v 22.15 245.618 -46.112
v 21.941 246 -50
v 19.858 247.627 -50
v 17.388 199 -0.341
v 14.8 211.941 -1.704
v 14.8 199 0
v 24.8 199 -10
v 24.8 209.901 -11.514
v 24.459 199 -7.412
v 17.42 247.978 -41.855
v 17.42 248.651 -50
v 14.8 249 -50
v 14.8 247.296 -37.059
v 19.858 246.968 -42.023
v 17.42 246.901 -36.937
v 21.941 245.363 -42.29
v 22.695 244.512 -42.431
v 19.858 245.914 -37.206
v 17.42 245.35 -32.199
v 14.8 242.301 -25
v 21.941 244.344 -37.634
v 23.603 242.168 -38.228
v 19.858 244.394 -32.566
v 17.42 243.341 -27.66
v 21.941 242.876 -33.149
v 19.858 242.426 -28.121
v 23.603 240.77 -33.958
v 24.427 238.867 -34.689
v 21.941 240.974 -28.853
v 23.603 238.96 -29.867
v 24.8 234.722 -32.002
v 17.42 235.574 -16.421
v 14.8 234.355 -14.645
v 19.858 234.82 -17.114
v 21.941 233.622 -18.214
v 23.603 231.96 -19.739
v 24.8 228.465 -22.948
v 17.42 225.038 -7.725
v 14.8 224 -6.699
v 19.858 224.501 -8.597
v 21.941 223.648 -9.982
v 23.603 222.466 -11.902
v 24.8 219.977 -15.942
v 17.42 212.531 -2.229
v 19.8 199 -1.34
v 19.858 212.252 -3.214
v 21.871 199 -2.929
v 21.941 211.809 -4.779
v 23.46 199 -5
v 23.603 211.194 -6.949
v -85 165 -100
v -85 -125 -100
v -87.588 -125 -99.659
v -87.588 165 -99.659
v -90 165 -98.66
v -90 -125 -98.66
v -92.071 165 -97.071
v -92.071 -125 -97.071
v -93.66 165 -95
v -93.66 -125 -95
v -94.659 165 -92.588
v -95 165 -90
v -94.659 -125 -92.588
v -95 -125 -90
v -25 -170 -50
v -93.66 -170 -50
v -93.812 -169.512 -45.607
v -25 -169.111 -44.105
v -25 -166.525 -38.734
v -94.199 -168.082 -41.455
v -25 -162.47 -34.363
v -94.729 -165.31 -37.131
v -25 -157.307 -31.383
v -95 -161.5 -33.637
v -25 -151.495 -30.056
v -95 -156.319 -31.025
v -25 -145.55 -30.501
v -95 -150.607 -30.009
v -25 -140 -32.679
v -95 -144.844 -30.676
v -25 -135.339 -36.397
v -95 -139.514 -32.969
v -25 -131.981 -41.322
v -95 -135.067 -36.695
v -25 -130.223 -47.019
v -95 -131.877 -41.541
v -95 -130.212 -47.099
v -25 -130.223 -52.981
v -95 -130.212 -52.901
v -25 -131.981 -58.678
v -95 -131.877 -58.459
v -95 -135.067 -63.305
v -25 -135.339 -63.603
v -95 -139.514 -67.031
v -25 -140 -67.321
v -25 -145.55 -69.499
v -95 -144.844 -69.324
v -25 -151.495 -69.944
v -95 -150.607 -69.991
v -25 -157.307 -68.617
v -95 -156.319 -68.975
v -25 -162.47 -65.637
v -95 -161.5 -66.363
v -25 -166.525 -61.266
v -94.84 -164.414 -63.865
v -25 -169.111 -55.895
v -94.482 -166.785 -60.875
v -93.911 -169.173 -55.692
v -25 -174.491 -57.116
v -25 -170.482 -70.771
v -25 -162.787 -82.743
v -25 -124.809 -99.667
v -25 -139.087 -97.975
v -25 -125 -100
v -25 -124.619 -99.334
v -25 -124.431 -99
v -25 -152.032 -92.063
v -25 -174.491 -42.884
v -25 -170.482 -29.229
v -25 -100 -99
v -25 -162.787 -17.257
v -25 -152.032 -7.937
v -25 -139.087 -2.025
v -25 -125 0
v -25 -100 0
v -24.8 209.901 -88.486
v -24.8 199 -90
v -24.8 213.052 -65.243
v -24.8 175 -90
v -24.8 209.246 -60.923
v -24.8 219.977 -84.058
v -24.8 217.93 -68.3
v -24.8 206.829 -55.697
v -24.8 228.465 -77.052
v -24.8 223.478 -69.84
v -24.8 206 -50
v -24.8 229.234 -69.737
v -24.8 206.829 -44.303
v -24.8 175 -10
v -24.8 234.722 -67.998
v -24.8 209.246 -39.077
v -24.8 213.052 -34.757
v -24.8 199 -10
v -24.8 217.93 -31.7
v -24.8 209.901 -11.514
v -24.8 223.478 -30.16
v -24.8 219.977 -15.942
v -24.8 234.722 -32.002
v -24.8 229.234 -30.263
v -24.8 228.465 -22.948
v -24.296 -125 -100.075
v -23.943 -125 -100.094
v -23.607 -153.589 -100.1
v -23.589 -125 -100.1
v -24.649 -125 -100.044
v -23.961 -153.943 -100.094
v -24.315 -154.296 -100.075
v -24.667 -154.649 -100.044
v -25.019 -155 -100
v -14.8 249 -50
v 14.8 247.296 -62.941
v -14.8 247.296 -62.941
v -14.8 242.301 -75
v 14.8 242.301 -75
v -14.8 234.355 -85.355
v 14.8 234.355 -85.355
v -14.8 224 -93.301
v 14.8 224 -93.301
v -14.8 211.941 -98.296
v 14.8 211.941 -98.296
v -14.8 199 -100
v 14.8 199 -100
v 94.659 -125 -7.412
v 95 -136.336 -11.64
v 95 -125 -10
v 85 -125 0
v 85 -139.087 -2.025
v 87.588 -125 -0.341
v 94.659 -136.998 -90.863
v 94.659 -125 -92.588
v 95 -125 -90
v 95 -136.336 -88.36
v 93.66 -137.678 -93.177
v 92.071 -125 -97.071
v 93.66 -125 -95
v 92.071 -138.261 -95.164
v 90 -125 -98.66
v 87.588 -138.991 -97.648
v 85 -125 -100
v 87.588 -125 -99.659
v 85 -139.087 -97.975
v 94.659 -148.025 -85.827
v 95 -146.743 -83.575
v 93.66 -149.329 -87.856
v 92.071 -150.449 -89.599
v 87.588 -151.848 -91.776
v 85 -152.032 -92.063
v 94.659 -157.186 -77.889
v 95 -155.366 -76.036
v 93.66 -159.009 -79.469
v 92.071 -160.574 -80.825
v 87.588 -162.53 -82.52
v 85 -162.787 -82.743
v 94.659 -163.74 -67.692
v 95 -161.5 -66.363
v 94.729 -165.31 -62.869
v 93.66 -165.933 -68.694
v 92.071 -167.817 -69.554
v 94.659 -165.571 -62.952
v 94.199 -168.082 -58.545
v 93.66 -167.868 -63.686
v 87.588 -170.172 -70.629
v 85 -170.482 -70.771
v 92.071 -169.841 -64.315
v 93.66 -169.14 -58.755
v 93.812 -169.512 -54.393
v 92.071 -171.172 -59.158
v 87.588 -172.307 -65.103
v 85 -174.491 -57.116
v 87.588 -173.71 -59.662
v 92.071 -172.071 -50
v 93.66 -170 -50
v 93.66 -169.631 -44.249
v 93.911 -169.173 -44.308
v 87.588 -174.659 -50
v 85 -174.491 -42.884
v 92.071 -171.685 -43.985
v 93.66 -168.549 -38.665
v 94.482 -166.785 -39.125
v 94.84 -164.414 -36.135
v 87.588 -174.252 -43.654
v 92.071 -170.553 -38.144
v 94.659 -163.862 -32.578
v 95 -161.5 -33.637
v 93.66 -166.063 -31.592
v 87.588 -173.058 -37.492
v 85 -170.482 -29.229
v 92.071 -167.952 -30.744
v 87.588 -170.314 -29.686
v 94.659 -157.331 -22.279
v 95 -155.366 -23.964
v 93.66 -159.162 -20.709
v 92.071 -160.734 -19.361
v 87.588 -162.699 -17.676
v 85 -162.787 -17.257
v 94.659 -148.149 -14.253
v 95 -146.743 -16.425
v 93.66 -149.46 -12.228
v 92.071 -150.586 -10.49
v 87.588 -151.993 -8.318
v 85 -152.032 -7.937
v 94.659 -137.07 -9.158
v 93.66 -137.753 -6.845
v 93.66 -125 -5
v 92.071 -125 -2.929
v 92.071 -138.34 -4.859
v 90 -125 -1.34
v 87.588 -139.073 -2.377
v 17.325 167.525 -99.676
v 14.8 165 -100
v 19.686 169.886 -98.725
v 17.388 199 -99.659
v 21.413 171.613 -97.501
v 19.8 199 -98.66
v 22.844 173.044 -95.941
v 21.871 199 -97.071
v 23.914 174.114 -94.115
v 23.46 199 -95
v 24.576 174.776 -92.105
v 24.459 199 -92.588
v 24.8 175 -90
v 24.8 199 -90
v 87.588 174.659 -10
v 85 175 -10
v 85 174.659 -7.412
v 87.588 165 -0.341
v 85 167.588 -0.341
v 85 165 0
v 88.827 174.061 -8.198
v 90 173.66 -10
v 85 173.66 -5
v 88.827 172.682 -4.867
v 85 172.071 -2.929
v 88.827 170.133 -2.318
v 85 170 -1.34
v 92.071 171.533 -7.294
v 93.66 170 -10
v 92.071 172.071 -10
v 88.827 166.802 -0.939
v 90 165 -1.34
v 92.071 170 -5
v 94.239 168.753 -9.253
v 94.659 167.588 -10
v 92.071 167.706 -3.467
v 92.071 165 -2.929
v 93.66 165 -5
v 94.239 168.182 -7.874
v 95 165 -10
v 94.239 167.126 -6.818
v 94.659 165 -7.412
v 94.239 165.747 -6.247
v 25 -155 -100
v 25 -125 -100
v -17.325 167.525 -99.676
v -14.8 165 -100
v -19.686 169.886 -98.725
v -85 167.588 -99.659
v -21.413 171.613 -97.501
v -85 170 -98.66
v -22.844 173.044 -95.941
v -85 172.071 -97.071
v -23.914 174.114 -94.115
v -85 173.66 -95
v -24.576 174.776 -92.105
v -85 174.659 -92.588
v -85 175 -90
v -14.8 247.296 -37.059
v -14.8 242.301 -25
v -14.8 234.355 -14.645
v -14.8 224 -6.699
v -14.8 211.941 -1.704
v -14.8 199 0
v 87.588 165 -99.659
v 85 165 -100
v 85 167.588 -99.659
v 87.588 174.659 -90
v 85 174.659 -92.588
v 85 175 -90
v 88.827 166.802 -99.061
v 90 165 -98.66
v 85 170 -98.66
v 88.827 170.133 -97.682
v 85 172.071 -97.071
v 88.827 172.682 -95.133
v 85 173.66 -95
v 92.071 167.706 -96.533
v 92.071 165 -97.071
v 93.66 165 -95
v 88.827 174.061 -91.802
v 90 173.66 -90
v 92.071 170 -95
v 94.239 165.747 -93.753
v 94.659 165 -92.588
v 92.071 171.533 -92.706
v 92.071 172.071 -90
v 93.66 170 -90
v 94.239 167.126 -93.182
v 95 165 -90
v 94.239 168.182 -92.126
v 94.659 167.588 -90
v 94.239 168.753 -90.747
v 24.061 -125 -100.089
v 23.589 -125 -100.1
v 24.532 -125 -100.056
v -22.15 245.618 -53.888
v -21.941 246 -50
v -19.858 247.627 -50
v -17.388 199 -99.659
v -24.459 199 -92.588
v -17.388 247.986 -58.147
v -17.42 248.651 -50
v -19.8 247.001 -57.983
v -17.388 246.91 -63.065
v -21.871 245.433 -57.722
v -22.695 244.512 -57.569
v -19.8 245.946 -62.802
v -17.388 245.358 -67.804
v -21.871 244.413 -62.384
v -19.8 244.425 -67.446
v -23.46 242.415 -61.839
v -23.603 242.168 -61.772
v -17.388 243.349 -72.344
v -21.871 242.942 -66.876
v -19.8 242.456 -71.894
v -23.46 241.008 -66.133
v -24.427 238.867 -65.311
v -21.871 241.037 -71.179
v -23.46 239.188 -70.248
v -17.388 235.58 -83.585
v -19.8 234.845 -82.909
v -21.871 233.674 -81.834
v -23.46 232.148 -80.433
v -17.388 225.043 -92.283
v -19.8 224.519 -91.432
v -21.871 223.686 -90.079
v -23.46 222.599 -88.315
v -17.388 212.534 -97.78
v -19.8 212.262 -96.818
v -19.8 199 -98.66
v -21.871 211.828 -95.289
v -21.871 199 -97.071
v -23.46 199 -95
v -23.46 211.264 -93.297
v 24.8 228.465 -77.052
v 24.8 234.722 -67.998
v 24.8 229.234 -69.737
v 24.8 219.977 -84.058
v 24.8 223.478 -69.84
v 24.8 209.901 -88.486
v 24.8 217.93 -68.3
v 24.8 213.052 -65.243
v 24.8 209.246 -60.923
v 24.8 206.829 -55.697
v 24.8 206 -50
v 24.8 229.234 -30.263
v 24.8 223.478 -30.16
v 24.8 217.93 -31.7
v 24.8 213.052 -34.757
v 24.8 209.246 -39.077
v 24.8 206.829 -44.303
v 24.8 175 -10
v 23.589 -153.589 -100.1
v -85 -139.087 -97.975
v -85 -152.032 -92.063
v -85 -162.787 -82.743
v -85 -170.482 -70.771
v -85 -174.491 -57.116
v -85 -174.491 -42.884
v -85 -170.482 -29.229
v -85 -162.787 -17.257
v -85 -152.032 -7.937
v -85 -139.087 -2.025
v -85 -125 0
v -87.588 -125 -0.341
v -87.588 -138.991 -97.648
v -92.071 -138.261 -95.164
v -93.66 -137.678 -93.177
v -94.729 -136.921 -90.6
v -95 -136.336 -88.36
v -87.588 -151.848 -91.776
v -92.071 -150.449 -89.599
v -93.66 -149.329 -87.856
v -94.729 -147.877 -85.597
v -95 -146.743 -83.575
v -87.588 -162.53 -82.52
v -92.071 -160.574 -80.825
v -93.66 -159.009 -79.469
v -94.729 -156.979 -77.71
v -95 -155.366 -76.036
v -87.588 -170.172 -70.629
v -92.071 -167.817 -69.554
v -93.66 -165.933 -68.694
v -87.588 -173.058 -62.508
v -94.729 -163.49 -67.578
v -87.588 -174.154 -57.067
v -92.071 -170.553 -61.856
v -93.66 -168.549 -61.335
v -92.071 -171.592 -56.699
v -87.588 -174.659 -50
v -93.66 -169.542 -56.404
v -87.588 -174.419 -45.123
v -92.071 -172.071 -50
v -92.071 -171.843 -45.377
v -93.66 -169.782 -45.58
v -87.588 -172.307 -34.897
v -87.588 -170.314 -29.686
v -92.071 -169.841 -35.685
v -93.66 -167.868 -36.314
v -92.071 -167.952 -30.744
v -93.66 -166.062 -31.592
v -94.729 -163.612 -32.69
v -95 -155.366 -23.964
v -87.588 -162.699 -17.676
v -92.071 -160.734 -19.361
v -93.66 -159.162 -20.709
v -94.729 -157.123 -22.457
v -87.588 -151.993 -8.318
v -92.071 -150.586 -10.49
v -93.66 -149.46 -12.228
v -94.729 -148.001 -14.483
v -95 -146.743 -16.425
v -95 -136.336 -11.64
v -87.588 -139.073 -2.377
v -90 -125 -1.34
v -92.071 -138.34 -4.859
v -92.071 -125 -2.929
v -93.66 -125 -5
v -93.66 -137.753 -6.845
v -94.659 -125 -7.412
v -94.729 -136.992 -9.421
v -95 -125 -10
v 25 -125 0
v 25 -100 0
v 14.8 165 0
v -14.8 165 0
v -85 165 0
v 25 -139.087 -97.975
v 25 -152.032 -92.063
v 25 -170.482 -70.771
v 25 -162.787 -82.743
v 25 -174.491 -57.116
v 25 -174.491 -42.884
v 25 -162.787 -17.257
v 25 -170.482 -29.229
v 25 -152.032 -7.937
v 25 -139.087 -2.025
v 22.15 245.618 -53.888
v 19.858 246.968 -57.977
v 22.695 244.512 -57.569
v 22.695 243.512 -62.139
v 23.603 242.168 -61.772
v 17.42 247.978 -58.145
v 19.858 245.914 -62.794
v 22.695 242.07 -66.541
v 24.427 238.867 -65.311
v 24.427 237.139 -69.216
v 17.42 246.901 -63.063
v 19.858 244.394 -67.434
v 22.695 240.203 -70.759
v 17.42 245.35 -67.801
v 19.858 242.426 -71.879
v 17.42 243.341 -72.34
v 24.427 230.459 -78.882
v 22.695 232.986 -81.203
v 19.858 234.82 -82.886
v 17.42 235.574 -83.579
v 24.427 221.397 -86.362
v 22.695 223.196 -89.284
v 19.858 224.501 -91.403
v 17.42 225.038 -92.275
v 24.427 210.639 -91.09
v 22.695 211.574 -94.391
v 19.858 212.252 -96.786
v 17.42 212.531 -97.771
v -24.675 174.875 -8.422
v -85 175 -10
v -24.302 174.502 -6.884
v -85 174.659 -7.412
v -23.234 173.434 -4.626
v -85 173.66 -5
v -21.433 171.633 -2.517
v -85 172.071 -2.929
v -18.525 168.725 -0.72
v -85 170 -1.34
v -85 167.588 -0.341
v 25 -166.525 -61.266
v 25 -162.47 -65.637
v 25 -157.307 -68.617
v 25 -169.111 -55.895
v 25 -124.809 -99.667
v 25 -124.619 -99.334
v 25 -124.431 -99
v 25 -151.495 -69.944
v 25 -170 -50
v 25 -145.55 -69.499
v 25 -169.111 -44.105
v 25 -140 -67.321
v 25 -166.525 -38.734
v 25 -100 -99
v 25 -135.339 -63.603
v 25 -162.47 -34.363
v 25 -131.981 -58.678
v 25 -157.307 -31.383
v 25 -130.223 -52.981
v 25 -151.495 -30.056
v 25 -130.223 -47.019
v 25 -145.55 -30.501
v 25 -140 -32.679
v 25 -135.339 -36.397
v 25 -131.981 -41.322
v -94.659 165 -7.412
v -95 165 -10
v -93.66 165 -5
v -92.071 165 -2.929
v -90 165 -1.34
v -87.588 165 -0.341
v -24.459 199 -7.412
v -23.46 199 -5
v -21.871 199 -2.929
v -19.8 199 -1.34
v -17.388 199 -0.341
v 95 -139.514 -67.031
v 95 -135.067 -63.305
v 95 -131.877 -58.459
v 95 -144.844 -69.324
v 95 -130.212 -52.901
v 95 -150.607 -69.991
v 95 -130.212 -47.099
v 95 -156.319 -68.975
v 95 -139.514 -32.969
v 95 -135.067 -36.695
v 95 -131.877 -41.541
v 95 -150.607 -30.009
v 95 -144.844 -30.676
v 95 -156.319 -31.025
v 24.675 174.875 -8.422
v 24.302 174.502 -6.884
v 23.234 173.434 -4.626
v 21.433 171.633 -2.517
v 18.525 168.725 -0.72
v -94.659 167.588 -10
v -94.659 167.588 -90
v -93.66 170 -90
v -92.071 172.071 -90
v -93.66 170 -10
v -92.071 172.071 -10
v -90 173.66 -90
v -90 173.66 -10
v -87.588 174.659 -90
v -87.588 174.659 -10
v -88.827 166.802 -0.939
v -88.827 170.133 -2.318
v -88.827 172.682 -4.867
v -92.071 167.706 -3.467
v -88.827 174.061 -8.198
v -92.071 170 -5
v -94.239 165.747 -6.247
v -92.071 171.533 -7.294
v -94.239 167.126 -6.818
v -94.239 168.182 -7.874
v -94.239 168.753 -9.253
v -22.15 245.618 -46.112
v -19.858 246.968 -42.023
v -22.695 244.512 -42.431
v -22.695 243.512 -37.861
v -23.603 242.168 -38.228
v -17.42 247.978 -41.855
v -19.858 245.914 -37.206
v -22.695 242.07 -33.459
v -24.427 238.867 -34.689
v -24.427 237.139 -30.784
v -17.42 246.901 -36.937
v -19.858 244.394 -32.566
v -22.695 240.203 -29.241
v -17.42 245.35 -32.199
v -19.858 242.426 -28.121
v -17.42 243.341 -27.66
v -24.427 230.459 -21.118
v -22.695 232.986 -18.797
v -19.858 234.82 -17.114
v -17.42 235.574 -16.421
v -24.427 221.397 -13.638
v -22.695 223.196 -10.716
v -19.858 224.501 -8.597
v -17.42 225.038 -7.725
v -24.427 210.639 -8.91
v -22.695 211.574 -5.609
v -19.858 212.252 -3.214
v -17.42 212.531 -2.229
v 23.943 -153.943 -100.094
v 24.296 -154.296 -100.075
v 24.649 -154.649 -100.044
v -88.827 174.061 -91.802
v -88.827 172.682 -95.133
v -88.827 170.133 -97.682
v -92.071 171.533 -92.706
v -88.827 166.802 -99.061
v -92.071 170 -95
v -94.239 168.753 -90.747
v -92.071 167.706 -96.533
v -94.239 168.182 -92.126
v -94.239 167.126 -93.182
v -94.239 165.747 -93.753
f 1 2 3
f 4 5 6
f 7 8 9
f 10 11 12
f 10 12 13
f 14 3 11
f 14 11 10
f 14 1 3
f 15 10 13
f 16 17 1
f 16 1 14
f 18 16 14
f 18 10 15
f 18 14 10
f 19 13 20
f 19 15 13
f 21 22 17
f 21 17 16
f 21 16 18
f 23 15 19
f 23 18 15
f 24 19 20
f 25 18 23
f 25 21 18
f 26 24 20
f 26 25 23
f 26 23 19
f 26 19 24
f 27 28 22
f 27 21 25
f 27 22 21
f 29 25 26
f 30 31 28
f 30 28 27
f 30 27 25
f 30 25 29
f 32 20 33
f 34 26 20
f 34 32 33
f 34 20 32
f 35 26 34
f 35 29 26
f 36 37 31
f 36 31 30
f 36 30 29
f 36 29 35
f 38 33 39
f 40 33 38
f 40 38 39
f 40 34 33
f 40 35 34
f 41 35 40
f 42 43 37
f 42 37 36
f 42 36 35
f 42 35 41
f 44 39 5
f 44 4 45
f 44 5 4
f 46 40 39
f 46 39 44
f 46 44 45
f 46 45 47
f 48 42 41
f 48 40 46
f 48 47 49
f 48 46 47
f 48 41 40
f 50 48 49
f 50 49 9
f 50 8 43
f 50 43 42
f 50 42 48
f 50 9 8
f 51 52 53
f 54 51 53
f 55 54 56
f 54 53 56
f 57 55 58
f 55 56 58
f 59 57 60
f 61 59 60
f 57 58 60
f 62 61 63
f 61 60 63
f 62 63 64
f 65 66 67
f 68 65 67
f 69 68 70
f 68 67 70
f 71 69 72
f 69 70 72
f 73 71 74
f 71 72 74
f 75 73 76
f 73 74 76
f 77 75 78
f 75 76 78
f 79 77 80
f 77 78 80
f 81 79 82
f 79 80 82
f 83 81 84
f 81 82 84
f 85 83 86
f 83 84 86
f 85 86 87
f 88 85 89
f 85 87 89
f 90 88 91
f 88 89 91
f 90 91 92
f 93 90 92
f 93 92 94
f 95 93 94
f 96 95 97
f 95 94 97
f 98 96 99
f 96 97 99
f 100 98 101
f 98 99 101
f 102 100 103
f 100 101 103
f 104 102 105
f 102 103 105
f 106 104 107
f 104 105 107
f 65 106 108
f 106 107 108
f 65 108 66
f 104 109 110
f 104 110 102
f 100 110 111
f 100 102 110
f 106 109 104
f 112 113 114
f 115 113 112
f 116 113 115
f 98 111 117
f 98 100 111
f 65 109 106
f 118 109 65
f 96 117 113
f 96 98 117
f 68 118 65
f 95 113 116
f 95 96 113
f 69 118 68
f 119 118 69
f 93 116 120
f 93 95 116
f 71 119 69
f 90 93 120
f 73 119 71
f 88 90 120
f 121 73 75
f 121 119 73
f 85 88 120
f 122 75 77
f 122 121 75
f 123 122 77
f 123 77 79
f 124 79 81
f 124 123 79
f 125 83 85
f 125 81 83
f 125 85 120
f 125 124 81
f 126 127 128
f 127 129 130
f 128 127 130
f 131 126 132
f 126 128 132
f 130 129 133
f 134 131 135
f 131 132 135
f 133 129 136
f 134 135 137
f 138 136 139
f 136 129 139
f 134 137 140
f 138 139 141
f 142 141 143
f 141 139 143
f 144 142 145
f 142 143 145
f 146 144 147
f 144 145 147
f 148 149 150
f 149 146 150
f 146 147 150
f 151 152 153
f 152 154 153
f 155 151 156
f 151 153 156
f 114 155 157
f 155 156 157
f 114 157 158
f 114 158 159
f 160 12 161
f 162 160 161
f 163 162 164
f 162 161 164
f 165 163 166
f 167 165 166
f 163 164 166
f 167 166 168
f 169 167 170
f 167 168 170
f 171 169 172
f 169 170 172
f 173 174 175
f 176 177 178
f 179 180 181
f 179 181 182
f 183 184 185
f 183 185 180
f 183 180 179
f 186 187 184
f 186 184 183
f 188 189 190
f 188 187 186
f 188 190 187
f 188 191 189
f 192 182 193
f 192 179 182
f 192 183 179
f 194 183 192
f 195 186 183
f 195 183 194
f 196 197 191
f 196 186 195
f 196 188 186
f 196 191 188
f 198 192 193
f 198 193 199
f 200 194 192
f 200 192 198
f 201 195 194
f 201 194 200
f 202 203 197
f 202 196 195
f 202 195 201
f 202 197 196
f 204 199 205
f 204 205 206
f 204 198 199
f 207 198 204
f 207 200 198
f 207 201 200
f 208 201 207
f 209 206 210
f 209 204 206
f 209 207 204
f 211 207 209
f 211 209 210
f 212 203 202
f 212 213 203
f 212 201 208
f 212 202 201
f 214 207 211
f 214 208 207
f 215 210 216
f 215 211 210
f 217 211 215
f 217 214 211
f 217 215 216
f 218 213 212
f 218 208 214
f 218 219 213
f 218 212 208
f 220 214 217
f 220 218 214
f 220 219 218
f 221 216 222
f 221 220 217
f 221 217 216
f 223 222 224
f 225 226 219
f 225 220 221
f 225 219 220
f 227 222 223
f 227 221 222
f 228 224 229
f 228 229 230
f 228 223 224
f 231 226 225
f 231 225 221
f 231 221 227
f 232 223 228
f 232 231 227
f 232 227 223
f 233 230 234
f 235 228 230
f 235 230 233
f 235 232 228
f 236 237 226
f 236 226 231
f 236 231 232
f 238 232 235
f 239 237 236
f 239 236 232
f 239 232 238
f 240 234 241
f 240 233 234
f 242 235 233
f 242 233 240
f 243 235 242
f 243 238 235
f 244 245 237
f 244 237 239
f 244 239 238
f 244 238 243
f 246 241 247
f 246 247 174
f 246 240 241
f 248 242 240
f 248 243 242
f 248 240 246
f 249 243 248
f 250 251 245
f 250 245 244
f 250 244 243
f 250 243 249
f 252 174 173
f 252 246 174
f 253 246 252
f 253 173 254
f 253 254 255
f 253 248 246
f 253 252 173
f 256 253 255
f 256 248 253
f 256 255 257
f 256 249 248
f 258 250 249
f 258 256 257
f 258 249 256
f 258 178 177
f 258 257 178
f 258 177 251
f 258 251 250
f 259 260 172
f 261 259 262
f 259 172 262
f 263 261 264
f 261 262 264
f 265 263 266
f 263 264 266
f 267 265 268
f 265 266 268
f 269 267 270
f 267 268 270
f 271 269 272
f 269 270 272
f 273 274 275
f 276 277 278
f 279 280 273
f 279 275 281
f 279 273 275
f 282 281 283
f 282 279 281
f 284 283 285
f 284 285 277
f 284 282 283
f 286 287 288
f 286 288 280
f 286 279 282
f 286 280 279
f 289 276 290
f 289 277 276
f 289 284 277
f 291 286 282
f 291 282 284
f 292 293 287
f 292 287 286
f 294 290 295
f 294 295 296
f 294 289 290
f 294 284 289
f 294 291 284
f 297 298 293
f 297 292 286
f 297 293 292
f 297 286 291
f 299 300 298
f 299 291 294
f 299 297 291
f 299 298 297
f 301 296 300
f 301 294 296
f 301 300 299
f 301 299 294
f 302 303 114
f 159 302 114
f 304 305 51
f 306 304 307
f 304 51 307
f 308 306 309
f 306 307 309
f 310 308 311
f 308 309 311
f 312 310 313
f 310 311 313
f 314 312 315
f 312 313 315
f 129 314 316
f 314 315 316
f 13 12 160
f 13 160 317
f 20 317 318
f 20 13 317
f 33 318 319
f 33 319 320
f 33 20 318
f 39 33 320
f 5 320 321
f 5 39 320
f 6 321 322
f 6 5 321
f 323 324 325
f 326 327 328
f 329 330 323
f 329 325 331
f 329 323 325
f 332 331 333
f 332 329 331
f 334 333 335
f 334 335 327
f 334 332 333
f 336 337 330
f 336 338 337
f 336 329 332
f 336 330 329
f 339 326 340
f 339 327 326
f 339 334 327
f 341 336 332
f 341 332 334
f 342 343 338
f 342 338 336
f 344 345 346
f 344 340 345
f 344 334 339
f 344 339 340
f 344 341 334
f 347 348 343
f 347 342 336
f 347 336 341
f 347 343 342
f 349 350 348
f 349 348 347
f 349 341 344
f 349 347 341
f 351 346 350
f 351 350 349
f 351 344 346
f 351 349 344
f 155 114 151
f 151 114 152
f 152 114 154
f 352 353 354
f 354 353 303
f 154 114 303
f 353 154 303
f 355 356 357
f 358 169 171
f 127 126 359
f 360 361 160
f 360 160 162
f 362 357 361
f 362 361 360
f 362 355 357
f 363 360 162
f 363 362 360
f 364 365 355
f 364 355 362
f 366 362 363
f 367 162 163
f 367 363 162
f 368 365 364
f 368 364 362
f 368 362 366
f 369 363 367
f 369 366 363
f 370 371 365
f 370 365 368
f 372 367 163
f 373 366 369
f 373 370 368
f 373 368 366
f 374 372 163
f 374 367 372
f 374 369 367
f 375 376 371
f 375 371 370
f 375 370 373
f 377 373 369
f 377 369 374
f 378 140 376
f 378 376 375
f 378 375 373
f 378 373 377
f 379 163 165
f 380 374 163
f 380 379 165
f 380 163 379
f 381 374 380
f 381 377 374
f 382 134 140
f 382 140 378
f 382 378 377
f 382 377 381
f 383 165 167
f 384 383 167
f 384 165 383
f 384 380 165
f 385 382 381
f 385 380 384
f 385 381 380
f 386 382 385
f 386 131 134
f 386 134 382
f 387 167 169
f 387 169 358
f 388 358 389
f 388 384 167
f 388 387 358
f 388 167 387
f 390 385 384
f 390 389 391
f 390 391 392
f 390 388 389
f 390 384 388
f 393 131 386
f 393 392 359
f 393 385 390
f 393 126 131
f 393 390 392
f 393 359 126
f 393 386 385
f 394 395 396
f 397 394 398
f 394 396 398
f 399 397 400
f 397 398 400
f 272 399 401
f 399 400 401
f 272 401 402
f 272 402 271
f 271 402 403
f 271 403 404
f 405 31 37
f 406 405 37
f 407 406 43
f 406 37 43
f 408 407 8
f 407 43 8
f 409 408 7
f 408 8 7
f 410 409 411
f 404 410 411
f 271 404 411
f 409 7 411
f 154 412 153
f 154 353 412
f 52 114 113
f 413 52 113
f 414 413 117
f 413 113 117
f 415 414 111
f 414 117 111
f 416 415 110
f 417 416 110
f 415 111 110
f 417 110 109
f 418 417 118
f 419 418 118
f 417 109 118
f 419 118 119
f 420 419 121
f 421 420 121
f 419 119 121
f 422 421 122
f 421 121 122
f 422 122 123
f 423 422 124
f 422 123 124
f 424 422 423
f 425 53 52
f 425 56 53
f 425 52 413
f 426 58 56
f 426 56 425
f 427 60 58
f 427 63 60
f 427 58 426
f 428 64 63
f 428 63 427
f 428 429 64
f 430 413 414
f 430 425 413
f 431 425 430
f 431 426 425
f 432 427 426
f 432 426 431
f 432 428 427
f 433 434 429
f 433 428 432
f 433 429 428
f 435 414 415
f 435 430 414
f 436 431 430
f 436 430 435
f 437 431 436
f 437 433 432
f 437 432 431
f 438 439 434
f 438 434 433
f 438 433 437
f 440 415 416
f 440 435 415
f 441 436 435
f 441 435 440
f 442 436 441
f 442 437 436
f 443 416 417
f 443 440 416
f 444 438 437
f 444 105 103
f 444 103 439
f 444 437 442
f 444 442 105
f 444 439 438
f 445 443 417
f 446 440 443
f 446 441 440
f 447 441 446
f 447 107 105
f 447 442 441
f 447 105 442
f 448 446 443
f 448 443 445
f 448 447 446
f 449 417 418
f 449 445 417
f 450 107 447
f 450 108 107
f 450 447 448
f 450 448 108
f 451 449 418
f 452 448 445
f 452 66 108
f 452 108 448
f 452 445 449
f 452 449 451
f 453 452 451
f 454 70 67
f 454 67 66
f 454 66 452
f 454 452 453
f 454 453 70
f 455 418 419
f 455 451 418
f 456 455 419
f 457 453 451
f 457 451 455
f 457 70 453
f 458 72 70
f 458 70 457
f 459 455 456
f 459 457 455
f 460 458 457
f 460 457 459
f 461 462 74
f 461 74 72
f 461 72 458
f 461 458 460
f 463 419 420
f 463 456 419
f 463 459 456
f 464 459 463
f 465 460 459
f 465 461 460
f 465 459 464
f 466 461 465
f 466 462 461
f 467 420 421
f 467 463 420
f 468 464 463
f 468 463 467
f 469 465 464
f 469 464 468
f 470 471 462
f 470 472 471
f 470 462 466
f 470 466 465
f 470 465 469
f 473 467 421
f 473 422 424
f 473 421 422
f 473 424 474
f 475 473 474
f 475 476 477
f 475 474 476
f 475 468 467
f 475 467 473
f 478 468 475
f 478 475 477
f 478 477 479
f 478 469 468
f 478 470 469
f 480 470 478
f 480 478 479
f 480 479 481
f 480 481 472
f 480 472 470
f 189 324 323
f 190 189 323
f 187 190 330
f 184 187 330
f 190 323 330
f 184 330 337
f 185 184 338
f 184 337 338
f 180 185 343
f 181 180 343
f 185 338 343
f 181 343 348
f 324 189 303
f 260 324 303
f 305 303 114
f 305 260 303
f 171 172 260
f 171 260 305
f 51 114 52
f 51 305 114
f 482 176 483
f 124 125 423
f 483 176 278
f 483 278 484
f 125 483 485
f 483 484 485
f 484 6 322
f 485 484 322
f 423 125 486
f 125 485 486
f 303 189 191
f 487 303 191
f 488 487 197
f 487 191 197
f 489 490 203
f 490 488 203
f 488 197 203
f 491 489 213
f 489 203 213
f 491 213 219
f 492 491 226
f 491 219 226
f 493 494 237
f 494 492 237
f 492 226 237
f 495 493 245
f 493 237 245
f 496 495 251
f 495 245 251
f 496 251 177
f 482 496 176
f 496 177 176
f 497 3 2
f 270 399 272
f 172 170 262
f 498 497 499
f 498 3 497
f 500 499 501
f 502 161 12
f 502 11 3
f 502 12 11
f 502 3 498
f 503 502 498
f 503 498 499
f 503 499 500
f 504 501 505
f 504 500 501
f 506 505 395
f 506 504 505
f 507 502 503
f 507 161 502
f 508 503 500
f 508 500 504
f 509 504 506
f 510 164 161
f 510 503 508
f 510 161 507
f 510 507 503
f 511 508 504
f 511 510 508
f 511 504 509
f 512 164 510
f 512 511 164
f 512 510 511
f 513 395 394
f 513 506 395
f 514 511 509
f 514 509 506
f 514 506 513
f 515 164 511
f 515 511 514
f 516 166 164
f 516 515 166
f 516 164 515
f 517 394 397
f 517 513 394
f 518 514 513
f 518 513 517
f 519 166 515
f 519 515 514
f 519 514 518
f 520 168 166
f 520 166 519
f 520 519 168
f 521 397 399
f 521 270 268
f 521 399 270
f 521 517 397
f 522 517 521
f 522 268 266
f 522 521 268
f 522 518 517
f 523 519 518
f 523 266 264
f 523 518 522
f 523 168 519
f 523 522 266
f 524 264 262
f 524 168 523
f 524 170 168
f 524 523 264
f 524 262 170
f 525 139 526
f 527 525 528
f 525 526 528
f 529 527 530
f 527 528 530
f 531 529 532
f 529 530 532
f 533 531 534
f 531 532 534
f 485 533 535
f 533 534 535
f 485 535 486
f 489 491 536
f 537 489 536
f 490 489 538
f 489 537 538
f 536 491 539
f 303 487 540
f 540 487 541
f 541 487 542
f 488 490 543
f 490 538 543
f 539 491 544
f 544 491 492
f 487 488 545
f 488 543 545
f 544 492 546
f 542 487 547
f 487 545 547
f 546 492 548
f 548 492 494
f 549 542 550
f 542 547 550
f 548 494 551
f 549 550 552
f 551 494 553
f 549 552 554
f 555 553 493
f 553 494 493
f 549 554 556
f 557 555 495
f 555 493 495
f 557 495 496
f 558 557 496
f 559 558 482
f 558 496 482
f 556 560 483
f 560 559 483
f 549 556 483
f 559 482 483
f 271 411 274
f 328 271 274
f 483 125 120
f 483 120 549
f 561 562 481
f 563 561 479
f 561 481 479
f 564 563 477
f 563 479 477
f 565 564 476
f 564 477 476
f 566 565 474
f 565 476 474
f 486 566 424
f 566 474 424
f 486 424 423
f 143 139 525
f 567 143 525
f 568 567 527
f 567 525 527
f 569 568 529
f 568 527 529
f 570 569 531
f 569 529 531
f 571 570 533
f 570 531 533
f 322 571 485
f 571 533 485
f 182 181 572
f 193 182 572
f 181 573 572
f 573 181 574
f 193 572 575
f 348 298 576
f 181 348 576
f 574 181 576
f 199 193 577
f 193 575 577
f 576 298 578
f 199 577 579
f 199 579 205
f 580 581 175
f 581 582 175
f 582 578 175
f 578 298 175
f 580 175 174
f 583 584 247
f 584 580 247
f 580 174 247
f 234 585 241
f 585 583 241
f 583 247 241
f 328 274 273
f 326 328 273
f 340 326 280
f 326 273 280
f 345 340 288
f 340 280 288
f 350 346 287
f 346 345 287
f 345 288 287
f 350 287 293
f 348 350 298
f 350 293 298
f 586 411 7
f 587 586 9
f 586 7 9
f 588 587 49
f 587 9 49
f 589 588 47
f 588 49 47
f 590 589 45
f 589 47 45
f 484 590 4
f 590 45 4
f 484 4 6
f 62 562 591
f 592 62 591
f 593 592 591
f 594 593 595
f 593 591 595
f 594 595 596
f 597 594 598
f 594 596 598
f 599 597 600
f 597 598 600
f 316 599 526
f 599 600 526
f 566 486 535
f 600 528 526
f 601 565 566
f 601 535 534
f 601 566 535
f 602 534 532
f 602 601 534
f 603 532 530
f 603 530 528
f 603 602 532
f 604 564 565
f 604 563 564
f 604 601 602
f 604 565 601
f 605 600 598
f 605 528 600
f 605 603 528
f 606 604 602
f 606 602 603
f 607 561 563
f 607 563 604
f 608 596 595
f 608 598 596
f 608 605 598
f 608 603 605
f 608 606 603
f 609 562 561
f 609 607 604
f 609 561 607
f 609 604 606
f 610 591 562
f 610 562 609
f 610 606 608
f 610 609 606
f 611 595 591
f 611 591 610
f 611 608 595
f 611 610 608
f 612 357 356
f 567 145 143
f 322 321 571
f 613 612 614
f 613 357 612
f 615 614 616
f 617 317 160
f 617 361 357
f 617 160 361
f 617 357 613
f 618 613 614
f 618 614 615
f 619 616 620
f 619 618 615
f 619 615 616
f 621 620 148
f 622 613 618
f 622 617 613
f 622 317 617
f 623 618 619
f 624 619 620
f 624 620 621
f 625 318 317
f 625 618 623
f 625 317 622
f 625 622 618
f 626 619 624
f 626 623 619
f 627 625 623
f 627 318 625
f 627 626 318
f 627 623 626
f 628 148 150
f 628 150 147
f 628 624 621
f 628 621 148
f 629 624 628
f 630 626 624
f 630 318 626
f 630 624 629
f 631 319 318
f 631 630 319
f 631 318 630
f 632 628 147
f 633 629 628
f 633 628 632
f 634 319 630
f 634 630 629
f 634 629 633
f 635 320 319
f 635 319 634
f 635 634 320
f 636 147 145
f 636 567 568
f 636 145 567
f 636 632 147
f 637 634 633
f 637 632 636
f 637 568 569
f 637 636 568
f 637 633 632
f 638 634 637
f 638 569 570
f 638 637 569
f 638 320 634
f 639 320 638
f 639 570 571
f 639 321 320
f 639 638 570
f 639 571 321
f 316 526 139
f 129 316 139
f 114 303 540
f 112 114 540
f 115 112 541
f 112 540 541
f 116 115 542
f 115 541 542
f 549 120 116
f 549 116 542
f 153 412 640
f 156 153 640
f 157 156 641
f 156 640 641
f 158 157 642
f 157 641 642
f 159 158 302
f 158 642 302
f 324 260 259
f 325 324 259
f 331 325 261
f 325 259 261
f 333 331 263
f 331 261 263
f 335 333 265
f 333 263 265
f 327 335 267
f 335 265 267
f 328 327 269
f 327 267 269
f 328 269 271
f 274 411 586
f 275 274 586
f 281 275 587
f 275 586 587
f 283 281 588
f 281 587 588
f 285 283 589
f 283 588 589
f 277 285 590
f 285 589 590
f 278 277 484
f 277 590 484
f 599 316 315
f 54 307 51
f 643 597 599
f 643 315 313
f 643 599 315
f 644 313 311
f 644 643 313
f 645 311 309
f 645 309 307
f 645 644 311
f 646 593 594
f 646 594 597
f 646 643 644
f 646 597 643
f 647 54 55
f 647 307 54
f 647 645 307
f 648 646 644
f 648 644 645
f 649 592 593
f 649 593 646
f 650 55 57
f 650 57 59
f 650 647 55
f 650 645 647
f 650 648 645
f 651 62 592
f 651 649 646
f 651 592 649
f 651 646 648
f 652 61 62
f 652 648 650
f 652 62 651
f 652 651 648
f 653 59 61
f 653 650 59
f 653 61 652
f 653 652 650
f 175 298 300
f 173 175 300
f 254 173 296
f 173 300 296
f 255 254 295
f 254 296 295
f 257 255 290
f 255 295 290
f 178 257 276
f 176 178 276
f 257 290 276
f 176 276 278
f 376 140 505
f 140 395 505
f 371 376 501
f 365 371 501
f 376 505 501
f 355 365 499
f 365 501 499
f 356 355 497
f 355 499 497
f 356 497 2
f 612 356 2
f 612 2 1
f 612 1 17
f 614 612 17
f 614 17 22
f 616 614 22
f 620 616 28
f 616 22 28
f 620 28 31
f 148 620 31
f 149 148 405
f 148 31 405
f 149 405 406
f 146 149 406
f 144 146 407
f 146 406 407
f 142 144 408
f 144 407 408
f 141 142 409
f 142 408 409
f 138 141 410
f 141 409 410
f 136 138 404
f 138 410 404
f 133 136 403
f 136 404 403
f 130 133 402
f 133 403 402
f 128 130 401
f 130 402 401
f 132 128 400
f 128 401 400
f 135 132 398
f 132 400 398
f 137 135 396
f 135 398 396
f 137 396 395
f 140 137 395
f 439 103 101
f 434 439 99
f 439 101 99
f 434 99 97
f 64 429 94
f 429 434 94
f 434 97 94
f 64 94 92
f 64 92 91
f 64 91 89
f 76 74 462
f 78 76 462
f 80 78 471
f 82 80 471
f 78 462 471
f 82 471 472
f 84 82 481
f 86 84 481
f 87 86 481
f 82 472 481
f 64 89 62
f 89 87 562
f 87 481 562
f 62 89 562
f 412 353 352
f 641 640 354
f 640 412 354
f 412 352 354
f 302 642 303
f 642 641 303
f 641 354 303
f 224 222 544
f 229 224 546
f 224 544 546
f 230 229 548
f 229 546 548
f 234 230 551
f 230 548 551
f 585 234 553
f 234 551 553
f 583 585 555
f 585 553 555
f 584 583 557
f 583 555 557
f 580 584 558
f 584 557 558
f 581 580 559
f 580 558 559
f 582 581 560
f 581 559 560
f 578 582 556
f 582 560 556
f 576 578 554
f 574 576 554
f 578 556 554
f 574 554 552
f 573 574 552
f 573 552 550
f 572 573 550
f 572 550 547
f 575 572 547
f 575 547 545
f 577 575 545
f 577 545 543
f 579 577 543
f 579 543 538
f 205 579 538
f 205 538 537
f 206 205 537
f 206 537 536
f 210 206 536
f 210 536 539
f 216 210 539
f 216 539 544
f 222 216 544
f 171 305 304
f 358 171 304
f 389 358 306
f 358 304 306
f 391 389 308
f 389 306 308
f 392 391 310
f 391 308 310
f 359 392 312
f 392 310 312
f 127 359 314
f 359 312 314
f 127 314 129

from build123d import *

# Parameters (mm, degrees)
BOSS_EXTRUDE1_DEPTH = 100
SKETCH2_W           = 50
SKETCH2_H           = 50
CUT_EXTRUDE1_DEPTH  = 285.650663094
FILLET1_R           = 50
CUT_EXTRUDE2_DEPTH  = 25
SKETCH7_R           = 20
CUT_EXTRUDE3_DEPTH  = 329.7871652
FILLET2_R           = 50
SKETCH9_W           = 50
SKETCH9_H           = 12.5
CUT_EXTRUDE6_DEPTH  = 285.650663094
CUT_EXTRUDE7_DEPTH  = 25
FILLET3_R           = 10
SKETCH11_W          = 50
SKETCH11_H          = 25
CUT_EXTRUDE8_DEPTH  = 99
BOSS_EXTRUDE7_DEPTH = 0.1
FILLET4_R           = 10
FILLET5_R           = 10
SKETCH14_R          = 20
CUT_EXTRUDE9_DEPTH  = 294.892922803


# Some blends are built 0.0001 mm under size
with BuildPart() as part:
    # Sketch1 → Boss-Extrude1 (new body)
    with BuildSketch(Plane.XY):
        Polygon((-24.8, 175), (-24.8, 249), (24.8, 249), (24.8, 175), (95, 175), (95, -175), (-95, -175), (-95, 175), align=None)
    extrude(amount=-BOSS_EXTRUDE1_DEPTH)

    # Sketch2 → Cut-Extrude1 (cut, through all)
    with BuildSketch(Plane.XY):
        with Locations((0, -175)):
            Rectangle(SKETCH2_W, SKETCH2_H)
    extrude(amount=-CUT_EXTRUDE1_DEPTH, mode=Mode.SUBTRACT)

    # Fillet1
    fillet1_edges = [part.edges().sort_by_distance(p)[0] for p in [
        (0, 249, -100),
        (0, 249, 0),
    ]]
    fillet(fillet1_edges, radius=FILLET1_R - 0.0001)  # a hair under: the kernel refuses the full size

    # Sketch6 → Cut-Extrude2 (cut, symmetric)
    with BuildSketch(Plane(origin=(0, 0, 0), x_dir=(0, 0, -1), z_dir=(1, 0, 0))):
        with BuildLine():
            Line((100, -150), (0, -150))
            ThreePointArc((0, -150), (50, -100), (100, -150))
        make_face()
    extrude(amount=CUT_EXTRUDE2_DEPTH, both=True, mode=Mode.SUBTRACT)

    # Sketch7 → Cut-Extrude3 (cut, through all)
    with BuildSketch(Plane.ZY.offset(95)):
        with Locations(Location((-50, -150, 0), (0, 0, 270))):
            Circle(SKETCH7_R)
    extrude(amount=-CUT_EXTRUDE3_DEPTH, mode=Mode.SUBTRACT)

    # Fillet2
    # the kernel refuses this fillet: 50 mm, written as the material it takes off along each edge
    with BuildSketch(Plane(origin=(100, -175, -100), x_dir=(0, 1, 0), z_dir=(-1, 0, 0))) as fillet2_piece_1:
        with BuildLine():
            CenterArc((FILLET2_R, -FILLET2_R), FILLET2_R, 90, 90)
            Line((0, -FILLET2_R), (0, 0))
            Line((0, 0), (FILLET2_R, 0))
        make_face()
    extrude(amount=320, mode=Mode.SUBTRACT)
    with BuildSketch(Plane(origin=(100, -175, 0), x_dir=(0, 1, 0), z_dir=(-1, 0, 0))) as fillet2_piece_2:
        with BuildLine():
            CenterArc((FILLET2_R, FILLET2_R), FILLET2_R, 180, 90)
            Line((0, FILLET2_R), (0, 0))
            Line((0, 0), (FILLET2_R, 0))
        make_face()
    extrude(amount=320, mode=Mode.SUBTRACT)

    # Sketch9 → Cut-Extrude6 (cut, through all)
    with BuildSketch(Plane.XY):
        with Locations((0, -131.25)):
            Rectangle(SKETCH9_W, SKETCH9_H)
    extrude(amount=-CUT_EXTRUDE6_DEPTH, mode=Mode.SUBTRACT)

    # Sketch10 → Cut-Extrude7 (cut, symmetric)
    with BuildSketch(Plane(origin=(0, 0, 0), x_dir=(0, 0, -1), z_dir=(1, 0, 0))):
        with BuildLine():
            Line((0, -125), (100, -125))
            ThreePointArc((100, -125), (50, -111.611517322), (0, -125))
        make_face()
    extrude(amount=CUT_EXTRUDE7_DEPTH, both=True, mode=Mode.SUBTRACT)

    # Fillet3
    # the kernel refuses this fillet: 10 mm, written as the material it takes off along each edge
    with BuildSketch(Plane(origin=(24.8, 199.0001, -100), x_dir=(-1, 0, 0), z_dir=(0, -1, 0)), Plane(origin=(-24.8, 175, 0), x_dir=(0, 0, -1), z_dir=(0, 1, 0))) as fillet3_piece_1:
        with BuildLine():
            CenterArc((FILLET3_R, -FILLET3_R), FILLET3_R, 90, 90)
            Line((0, -FILLET3_R), (0, 0))
            Line((0, 0), (FILLET3_R, 0))
        make_face()
    extrude(amount=24.0001, mode=Mode.SUBTRACT)
    with BuildSketch(Plane(origin=(24.8, 175, 0), x_dir=(0, -1, 0), z_dir=(1, 0, 0)), Plane(origin=(-120, 175, 0), x_dir=(0, -1, 0), z_dir=(1, 0, 0))) as fillet3_piece_2:
        with BuildLine():
            CenterArc((FILLET3_R, FILLET3_R), FILLET3_R, 180, 90)
            Line((0, FILLET3_R), (0, 0))
            Line((0, 0), (FILLET3_R, 0))
        make_face()
    extrude(amount=95.2, mode=Mode.SUBTRACT)
    with BuildSketch(Plane(origin=(-120, 175, -100), x_dir=(0, -1, 0), z_dir=(1, 0, 0)), Plane(origin=(24.8, 175, -100), x_dir=(0, -1, 0), z_dir=(1, 0, 0))) as fillet3_piece_3:
        with BuildLine():
            CenterArc((FILLET3_R, -FILLET3_R), FILLET3_R, 90, 90)
            Line((0, -FILLET3_R), (0, 0))
            Line((0, 0), (FILLET3_R, 0))
        make_face()
    extrude(amount=95.2, mode=Mode.SUBTRACT)
    with BuildSketch(Plane(origin=(-95, -125, -100), x_dir=(1, 0, 0), z_dir=(0, 1, 0)), Plane(origin=(95, 200, -100), x_dir=(-1, 0, 0), z_dir=(0, -1, 0))) as fillet3_piece_4:
        with BuildLine():
            CenterArc((FILLET3_R, -FILLET3_R), FILLET3_R, 90, 90)
            Line((0, -FILLET3_R), (0, 0))
            Line((0, 0), (FILLET3_R, 0))
        make_face()
    extrude(amount=325, mode=Mode.SUBTRACT)
    with BuildSketch(Plane(origin=(-24.8, 175, -100), x_dir=(0, 0, 1), z_dir=(0, 1, 0)), Plane(origin=(24.8, 199.0001, 0), x_dir=(-1, 0, 0), z_dir=(0, -1, 0))) as fillet3_piece_5:
        with BuildLine():
            CenterArc((FILLET3_R, FILLET3_R), FILLET3_R, 180, 90)
            Line((0, FILLET3_R), (0, 0))
            Line((0, 0), (FILLET3_R, 0))
        make_face()
    extrude(amount=24.0001, mode=Mode.SUBTRACT)
    with BuildSketch(Plane(origin=(-24.8, 199.0001, -49.9999), x_dir=(0, 1, 0), z_dir=(0, 0, -1))) as fillet3_piece_6:
        with BuildLine():
            CenterArc((49.9999 - FILLET3_R, FILLET3_R), FILLET3_R, 270, 90)
            Line((49.9999, FILLET3_R), (49.9999, 0))
            Line((49.9999, 0), (49.9999 - FILLET3_R, 0))
        make_face()
    revolve(axis=Axis((-24.8, 199.0001, -49.9999), (1, 0, 0)), revolution_arc=90, mode=Mode.SUBTRACT)
    with BuildSketch(Plane(origin=(-24.8, 199.0001, -50.0001), x_dir=(0, 1, 0), z_dir=(0, 0, 1))) as fillet3_piece_7:
        with BuildLine():
            CenterArc((49.9999 - FILLET3_R, -FILLET3_R), FILLET3_R, 0, 90)
            Line((49.9999, -FILLET3_R), (49.9999, 0))
            Line((49.9999, 0), (49.9999 - FILLET3_R, 0))
        make_face()
    revolve(axis=Axis((-24.8, 199.0001, -50.0001), (-1, 0, 0)), revolution_arc=90, mode=Mode.SUBTRACT)
    with BuildSketch(Plane(origin=(24.8, 199.0001, -49.9999), x_dir=(0, 1, 0), z_dir=(0, 0, -1))) as fillet3_piece_8:
        with BuildLine():
            CenterArc((49.9999 - FILLET3_R, -FILLET3_R), FILLET3_R, 0, 90)
            Line((49.9999 - FILLET3_R, 0), (49.9999, 0))
            Line((49.9999, 0), (49.9999, -FILLET3_R))
        make_face()
    revolve(axis=Axis((24.8, 199.0001, -49.9999), (1, 0, 0)), revolution_arc=90, mode=Mode.SUBTRACT)
    with BuildSketch(Plane(origin=(24.8, 199.0001, -50.0001), x_dir=(0, 1, 0), z_dir=(0, 0, 1))) as fillet3_piece_9:
        with BuildLine():
            CenterArc((49.9999 - FILLET3_R, FILLET3_R), FILLET3_R, 270, 90)
            Line((49.9999 - FILLET3_R, 0), (49.9999, 0))
            Line((49.9999, 0), (49.9999, FILLET3_R))
        make_face()
    revolve(axis=Axis((24.8, 199.0001, -50.0001), (-1, 0, 0)), revolution_arc=90, mode=Mode.SUBTRACT)
    with BuildSketch(Plane(origin=(95, 200, 0), x_dir=(-1, 0, 0), z_dir=(0, -1, 0)), Plane(origin=(-95, -125, 0), x_dir=(1, 0, 0), z_dir=(0, 1, 0))) as fillet3_piece_10:
        with BuildLine():
            CenterArc((FILLET3_R, FILLET3_R), FILLET3_R, 180, 90)
            Line((0, FILLET3_R), (0, 0))
            Line((0, 0), (FILLET3_R, 0))
        make_face()
    extrude(amount=325, mode=Mode.SUBTRACT)
    with BuildSketch(Plane(origin=(95, -125, -50), x_dir=(0, 0, -1), z_dir=(0, 1, 0))) as fillet3_piece_11:
        with BuildLine():
            CenterArc((50 - FILLET3_R, FILLET3_R), FILLET3_R, 270, 90)
            Line((50 - FILLET3_R, 0), (50, 0))
            Line((50, 0), (50, FILLET3_R))
        make_face()
    revolve(axis=Axis((95, -125, -50), (-1, 0, 0)), revolution_arc=180, mode=Mode.SUBTRACT)
    with BuildSketch(Plane(origin=(-95, -125, -50), x_dir=(0, 0, -1), z_dir=(0, 1, 0))) as fillet3_piece_12:
        with BuildLine():
            CenterArc((50 - FILLET3_R, -FILLET3_R), FILLET3_R, 0, 90)
            Line((50, -FILLET3_R), (50, 0))
            Line((50, 0), (50 - FILLET3_R, 0))
        make_face()
    revolve(axis=Axis((-95, -125, -50), (-1, 0, 0)), revolution_arc=180, mode=Mode.SUBTRACT)
    with BuildSketch(Plane(origin=(24.8, 249, -49.9999), x_dir=(-1, 0, 0), z_dir=(0, 0, -1)), Plane(origin=(-24.8, 249, -49.9999), x_dir=(0, -1, 0), z_dir=(0, 0, -1))) as fillet3_piece_13:
        with BuildLine():
            CenterArc((FILLET3_R, -FILLET3_R), FILLET3_R, 90, 90)
            Line((0, -FILLET3_R), (0, 0))
            Line((0, 0), (FILLET3_R, 0))
        make_face()
    extrude(amount=0.0002, mode=Mode.SUBTRACT)
    with BuildSketch(Plane(origin=(-0.2, 175, -100), x_dir=(0, -1, 0), z_dir=(1, 0, 0))) as fillet3_piece_14a_section:
        with BuildLine():
            CenterArc((FILLET3_R, -FILLET3_R), FILLET3_R, 90, 90)
            Line((0, -FILLET3_R), (0, 0))
            Line((0, 0), (FILLET3_R, 0))
        make_face()
    fillet3_piece_14a = extrude(amount=120.2, mode=Mode.PRIVATE)
    fillet3_piece_14a = split(fillet3_piece_14a, bisect_by=Plane(origin=(24.8, 172.736048857, -97.736048857), z_dir=(-1, 0, 0)), keep=Keep.TOP, mode=Mode.PRIVATE)
    with BuildSketch(Plane(origin=(24.8, 199.0001, -100), x_dir=(-1, 0, 0), z_dir=(0, -1, 0))) as fillet3_piece_14b_section:
        with BuildLine():
            CenterArc((FILLET3_R, -FILLET3_R), FILLET3_R, 90, 90)
            Line((0, -FILLET3_R), (0, 0))
            Line((0, 0), (FILLET3_R, 0))
        make_face()
    fillet3_piece_14b = extrude(amount=49.0001, mode=Mode.PRIVATE)
    fillet3_piece_14b = split(fillet3_piece_14b, bisect_by=Plane(origin=(22.536048857, 175, -97.736048857), z_dir=(0, -1, 0)), keep=Keep.TOP, mode=Mode.PRIVATE)
    fillet3_piece_14 = fillet3_piece_14a & fillet3_piece_14b
    add(fillet3_piece_14, mode=Mode.SUBTRACT)
    with BuildSketch(Plane(origin=(-0.2, 175, 0), x_dir=(0, -1, 0), z_dir=(1, 0, 0))) as fillet3_piece_15a_section:
        with BuildLine():
            CenterArc((FILLET3_R, FILLET3_R), FILLET3_R, 180, 90)
            Line((0, FILLET3_R), (0, 0))
            Line((0, 0), (FILLET3_R, 0))
        make_face()
    fillet3_piece_15a = extrude(amount=120.2, mode=Mode.PRIVATE)
    fillet3_piece_15a = split(fillet3_piece_15a, bisect_by=Plane(origin=(24.8, 172.736048857, -2.263951143), z_dir=(-1, 0, 0)), keep=Keep.TOP, mode=Mode.PRIVATE)
    with BuildSketch(Plane(origin=(24.8, 199.0001, 0), x_dir=(-1, 0, 0), z_dir=(0, -1, 0))) as fillet3_piece_15b_section:
        with BuildLine():
            CenterArc((FILLET3_R, FILLET3_R), FILLET3_R, 180, 90)
            Line((0, FILLET3_R), (0, 0))
            Line((0, 0), (FILLET3_R, 0))
        make_face()
    fillet3_piece_15b = extrude(amount=49.0001, mode=Mode.PRIVATE)
    fillet3_piece_15b = split(fillet3_piece_15b, bisect_by=Plane(origin=(22.536048857, 175, -2.263951143), z_dir=(0, -1, 0)), keep=Keep.TOP, mode=Mode.PRIVATE)
    fillet3_piece_15 = fillet3_piece_15a & fillet3_piece_15b
    add(fillet3_piece_15, mode=Mode.SUBTRACT)
    with BuildSketch(Plane(origin=(-24.8, 150, -100), x_dir=(0, 0, 1), z_dir=(0, 1, 0))) as fillet3_piece_16a_section:
        with BuildLine():
            CenterArc((FILLET3_R, FILLET3_R), FILLET3_R, 180, 90)
            Line((0, FILLET3_R), (0, 0))
            Line((0, 0), (FILLET3_R, 0))
        make_face()
    fillet3_piece_16a = extrude(amount=49.0001, mode=Mode.PRIVATE)
    fillet3_piece_16a = split(fillet3_piece_16a, bisect_by=Plane(origin=(-22.536048857, 175, -97.736048857), z_dir=(0, -1, 0)), keep=Keep.TOP, mode=Mode.PRIVATE)
    with BuildSketch(Plane(origin=(-120, 175, -100), x_dir=(0, -1, 0), z_dir=(1, 0, 0))) as fillet3_piece_16b_section:
        with BuildLine():
            CenterArc((FILLET3_R, -FILLET3_R), FILLET3_R, 90, 90)
            Line((0, -FILLET3_R), (0, 0))
            Line((0, 0), (FILLET3_R, 0))
        make_face()
    fillet3_piece_16b = extrude(amount=120.2, mode=Mode.PRIVATE)
    fillet3_piece_16b = split(fillet3_piece_16b, bisect_by=Plane(origin=(-24.8, 172.736048857, -97.736048857), z_dir=(1, 0, 0)), keep=Keep.TOP, mode=Mode.PRIVATE)
    fillet3_piece_16 = fillet3_piece_16a & fillet3_piece_16b
    add(fillet3_piece_16, mode=Mode.SUBTRACT)
    with BuildSketch(Plane(origin=(-24.8, 150, 0), x_dir=(0, 0, -1), z_dir=(0, 1, 0))) as fillet3_piece_17a_section:
        with BuildLine():
            CenterArc((FILLET3_R, -FILLET3_R), FILLET3_R, 90, 90)
            Line((0, -FILLET3_R), (0, 0))
            Line((0, 0), (FILLET3_R, 0))
        make_face()
    fillet3_piece_17a = extrude(amount=49.0001, mode=Mode.PRIVATE)
    fillet3_piece_17a = split(fillet3_piece_17a, bisect_by=Plane(origin=(-22.536048857, 175, -2.263951143), z_dir=(0, -1, 0)), keep=Keep.TOP, mode=Mode.PRIVATE)
    with BuildSketch(Plane(origin=(-120, 175, 0), x_dir=(0, -1, 0), z_dir=(1, 0, 0))) as fillet3_piece_17b_section:
        with BuildLine():
            CenterArc((FILLET3_R, FILLET3_R), FILLET3_R, 180, 90)
            Line((0, FILLET3_R), (0, 0))
            Line((0, 0), (FILLET3_R, 0))
        make_face()
    fillet3_piece_17b = extrude(amount=120.2, mode=Mode.PRIVATE)
    fillet3_piece_17b = split(fillet3_piece_17b, bisect_by=Plane(origin=(-24.8, 172.736048857, -2.263951143), z_dir=(1, 0, 0)), keep=Keep.TOP, mode=Mode.PRIVATE)
    fillet3_piece_17 = fillet3_piece_17a & fillet3_piece_17b
    add(fillet3_piece_17, mode=Mode.SUBTRACT)

    # Sketch11 → Cut-Extrude8 (cut)
    with BuildSketch(Plane.XY):
        with Locations((0, -112.5)):
            Rectangle(SKETCH11_W, SKETCH11_H)
    extrude(amount=-CUT_EXTRUDE8_DEPTH, mode=Mode.SUBTRACT)

    # Fillet5
    # the kernel refuses this fillet: 10 mm, written as the material it takes off along each edge
    with BuildSketch(Plane(origin=(85, 165, -10), x_dir=(0, 1, 0), z_dir=(1, 0, 0))) as fillet5_piece_1_section:
        Polygon((0, 0), (FILLET5_R, 0), (FILLET5_R, FILLET5_R), (0, FILLET5_R), align=None)
    fillet5_piece_1 = extrude(amount=FILLET5_R, mode=Mode.PRIVATE)
    fillet5_piece_1 = fillet5_piece_1 - Plane(origin=(85, 165, -10), x_dir=(0, -0.7071067811865475, -0.7071067811865475), z_dir=(1, 0, 0)) * Sphere(FILLET5_R, mode=Mode.PRIVATE)
    add(fillet5_piece_1, mode=Mode.SUBTRACT)
    with BuildSketch(Plane(origin=(85, 165, -90), x_dir=(0, 1, 0), z_dir=(1, 0, 0))) as fillet5_piece_2_section:
        Polygon((0, 0), (FILLET5_R, 0), (FILLET5_R, -FILLET5_R), (0, -FILLET5_R), align=None)
    fillet5_piece_2 = extrude(amount=FILLET5_R, mode=Mode.PRIVATE)
    fillet5_piece_2 = fillet5_piece_2 - Plane(origin=(85, 165, -90), x_dir=(0, -0.7071067811865475, 0.7071067811865475), z_dir=(1, 0, 0)) * Sphere(FILLET5_R, mode=Mode.PRIVATE)
    add(fillet5_piece_2, mode=Mode.SUBTRACT)
    with BuildSketch(Plane(origin=(-85, 165, -90), x_dir=(0, 1, 0), z_dir=(-1, 0, 0))) as fillet5_piece_3_section:
        Polygon((0, 0), (FILLET5_R, 0), (FILLET5_R, FILLET5_R), (0, FILLET5_R), align=None)
    fillet5_piece_3 = extrude(amount=FILLET5_R, mode=Mode.PRIVATE)
    fillet5_piece_3 = fillet5_piece_3 - Plane(origin=(-85, 165, -90), x_dir=(0, -0.7071067811865475, 0.7071067811865475), z_dir=(-1, 0, 0)) * Sphere(FILLET5_R, mode=Mode.PRIVATE)
    add(fillet5_piece_3, mode=Mode.SUBTRACT)
    with BuildSketch(Plane(origin=(-85, 165, -10), x_dir=(0, 1, 0), z_dir=(-1, 0, 0))) as fillet5_piece_4_section:
        Polygon((0, 0), (FILLET5_R, 0), (FILLET5_R, -FILLET5_R), (0, -FILLET5_R), align=None)
    fillet5_piece_4 = extrude(amount=FILLET5_R, mode=Mode.PRIVATE)
    fillet5_piece_4 = fillet5_piece_4 - Plane(origin=(-85, 165, -10), x_dir=(0, -0.7071067811865475, -0.7071067811865475), z_dir=(-1, 0, 0)) * Sphere(FILLET5_R, mode=Mode.PRIVATE)
    add(fillet5_piece_4, mode=Mode.SUBTRACT)
    with BuildSketch(Plane(origin=(95, 175, -10), x_dir=(0, -1, 0), z_dir=(0, 0, -1))) as fillet5_piece_5:
        with BuildLine():
            CenterArc((FILLET5_R, FILLET5_R), FILLET5_R, 180, 90)
            Line((0, FILLET5_R), (0, 0))
            Line((0, 0), (FILLET5_R, 0))
        make_face()
    extrude(amount=80, mode=Mode.SUBTRACT)
    with BuildSketch(Plane(origin=(-95, 175, -10), x_dir=(0, -1, 0), z_dir=(0, 0, -1))) as fillet5_piece_6:
        with BuildLine():
            CenterArc((FILLET5_R, -FILLET5_R), FILLET5_R, 90, 90)
            Line((0, -FILLET5_R), (0, 0))
            Line((0, 0), (FILLET5_R, 0))
        make_face()
    extrude(amount=80, mode=Mode.SUBTRACT)

    # Sketch14 → Cut-Extrude9 (cut, through all)
    with BuildSketch(Plane(origin=(24.8, 0, 0), x_dir=(0, 0, -1), z_dir=(1, 0, 0))):
        with Locations(Location((50, 226, 0), (0, 0, 25.856016698))):
            Circle(SKETCH14_R)
    extrude(amount=-CUT_EXTRUDE9_DEPTH, mode=Mode.SUBTRACT)


with BuildPart() as body_2:
    # Sketch13 → Boss-Extrude7 (new body)
    with BuildSketch(Plane(origin=(0, 0, -100), x_dir=(-1, 0, 0), z_dir=(0, 0, -1))):
        Polygon((-25, -125), (-25, -155), (25.018802851, -155), (25, -125), align=None)
    extrude(amount=BOSS_EXTRUDE7_DEPTH)

    # Fillet4
    # the kernel refuses this fillet: 10 mm, written as the material it takes off along each edge
    with BuildSketch(Plane(origin=(-25.021013242, -158.526683302, -100.1), x_dir=(0, 0, 1), z_dir=(0.000626761593063201, 0.9999998035849335, 0))) as fillet4_piece_1:
        with BuildLine():
            CenterArc((10, 1.410673598), FILLET4_R, 180, 8.109614456)
            Line((0, 1.410673598), (0, 0))
            Line((0, 0), (0.1, 0))
        make_face()
    extrude(amount=37.053373882, mode=Mode.SUBTRACT)
    with BuildSketch(Plane(origin=(25, -121.473316005, -100.1), x_dir=(0, 0, 1), z_dir=(0, -1, 0))) as fillet4_piece_2:
        with BuildLine():
            CenterArc((10, 1.410673598), FILLET4_R, 180, 8.109614456)
            Line((0, 1.410673598), (0, 0))
            Line((0, 0), (0.1, 0))
        make_face()
    extrude(amount=37.05336799, mode=Mode.SUBTRACT)
    with BuildSketch(Plane(origin=(28.526683995, -155, -100.1), x_dir=(0, 0, 1), z_dir=(-1, 0, 0))) as fillet4_piece_3:
        with BuildLine():
            CenterArc((10, 1.410673598), FILLET4_R, 180, 8.109614456)
            Line((0, 1.410673598), (0, 0))
            Line((0, 0), (0.1, 0))
        make_face()
    extrude(amount=57.072170841, mode=Mode.SUBTRACT)


solid = Compound([part.part, body_2.part])
